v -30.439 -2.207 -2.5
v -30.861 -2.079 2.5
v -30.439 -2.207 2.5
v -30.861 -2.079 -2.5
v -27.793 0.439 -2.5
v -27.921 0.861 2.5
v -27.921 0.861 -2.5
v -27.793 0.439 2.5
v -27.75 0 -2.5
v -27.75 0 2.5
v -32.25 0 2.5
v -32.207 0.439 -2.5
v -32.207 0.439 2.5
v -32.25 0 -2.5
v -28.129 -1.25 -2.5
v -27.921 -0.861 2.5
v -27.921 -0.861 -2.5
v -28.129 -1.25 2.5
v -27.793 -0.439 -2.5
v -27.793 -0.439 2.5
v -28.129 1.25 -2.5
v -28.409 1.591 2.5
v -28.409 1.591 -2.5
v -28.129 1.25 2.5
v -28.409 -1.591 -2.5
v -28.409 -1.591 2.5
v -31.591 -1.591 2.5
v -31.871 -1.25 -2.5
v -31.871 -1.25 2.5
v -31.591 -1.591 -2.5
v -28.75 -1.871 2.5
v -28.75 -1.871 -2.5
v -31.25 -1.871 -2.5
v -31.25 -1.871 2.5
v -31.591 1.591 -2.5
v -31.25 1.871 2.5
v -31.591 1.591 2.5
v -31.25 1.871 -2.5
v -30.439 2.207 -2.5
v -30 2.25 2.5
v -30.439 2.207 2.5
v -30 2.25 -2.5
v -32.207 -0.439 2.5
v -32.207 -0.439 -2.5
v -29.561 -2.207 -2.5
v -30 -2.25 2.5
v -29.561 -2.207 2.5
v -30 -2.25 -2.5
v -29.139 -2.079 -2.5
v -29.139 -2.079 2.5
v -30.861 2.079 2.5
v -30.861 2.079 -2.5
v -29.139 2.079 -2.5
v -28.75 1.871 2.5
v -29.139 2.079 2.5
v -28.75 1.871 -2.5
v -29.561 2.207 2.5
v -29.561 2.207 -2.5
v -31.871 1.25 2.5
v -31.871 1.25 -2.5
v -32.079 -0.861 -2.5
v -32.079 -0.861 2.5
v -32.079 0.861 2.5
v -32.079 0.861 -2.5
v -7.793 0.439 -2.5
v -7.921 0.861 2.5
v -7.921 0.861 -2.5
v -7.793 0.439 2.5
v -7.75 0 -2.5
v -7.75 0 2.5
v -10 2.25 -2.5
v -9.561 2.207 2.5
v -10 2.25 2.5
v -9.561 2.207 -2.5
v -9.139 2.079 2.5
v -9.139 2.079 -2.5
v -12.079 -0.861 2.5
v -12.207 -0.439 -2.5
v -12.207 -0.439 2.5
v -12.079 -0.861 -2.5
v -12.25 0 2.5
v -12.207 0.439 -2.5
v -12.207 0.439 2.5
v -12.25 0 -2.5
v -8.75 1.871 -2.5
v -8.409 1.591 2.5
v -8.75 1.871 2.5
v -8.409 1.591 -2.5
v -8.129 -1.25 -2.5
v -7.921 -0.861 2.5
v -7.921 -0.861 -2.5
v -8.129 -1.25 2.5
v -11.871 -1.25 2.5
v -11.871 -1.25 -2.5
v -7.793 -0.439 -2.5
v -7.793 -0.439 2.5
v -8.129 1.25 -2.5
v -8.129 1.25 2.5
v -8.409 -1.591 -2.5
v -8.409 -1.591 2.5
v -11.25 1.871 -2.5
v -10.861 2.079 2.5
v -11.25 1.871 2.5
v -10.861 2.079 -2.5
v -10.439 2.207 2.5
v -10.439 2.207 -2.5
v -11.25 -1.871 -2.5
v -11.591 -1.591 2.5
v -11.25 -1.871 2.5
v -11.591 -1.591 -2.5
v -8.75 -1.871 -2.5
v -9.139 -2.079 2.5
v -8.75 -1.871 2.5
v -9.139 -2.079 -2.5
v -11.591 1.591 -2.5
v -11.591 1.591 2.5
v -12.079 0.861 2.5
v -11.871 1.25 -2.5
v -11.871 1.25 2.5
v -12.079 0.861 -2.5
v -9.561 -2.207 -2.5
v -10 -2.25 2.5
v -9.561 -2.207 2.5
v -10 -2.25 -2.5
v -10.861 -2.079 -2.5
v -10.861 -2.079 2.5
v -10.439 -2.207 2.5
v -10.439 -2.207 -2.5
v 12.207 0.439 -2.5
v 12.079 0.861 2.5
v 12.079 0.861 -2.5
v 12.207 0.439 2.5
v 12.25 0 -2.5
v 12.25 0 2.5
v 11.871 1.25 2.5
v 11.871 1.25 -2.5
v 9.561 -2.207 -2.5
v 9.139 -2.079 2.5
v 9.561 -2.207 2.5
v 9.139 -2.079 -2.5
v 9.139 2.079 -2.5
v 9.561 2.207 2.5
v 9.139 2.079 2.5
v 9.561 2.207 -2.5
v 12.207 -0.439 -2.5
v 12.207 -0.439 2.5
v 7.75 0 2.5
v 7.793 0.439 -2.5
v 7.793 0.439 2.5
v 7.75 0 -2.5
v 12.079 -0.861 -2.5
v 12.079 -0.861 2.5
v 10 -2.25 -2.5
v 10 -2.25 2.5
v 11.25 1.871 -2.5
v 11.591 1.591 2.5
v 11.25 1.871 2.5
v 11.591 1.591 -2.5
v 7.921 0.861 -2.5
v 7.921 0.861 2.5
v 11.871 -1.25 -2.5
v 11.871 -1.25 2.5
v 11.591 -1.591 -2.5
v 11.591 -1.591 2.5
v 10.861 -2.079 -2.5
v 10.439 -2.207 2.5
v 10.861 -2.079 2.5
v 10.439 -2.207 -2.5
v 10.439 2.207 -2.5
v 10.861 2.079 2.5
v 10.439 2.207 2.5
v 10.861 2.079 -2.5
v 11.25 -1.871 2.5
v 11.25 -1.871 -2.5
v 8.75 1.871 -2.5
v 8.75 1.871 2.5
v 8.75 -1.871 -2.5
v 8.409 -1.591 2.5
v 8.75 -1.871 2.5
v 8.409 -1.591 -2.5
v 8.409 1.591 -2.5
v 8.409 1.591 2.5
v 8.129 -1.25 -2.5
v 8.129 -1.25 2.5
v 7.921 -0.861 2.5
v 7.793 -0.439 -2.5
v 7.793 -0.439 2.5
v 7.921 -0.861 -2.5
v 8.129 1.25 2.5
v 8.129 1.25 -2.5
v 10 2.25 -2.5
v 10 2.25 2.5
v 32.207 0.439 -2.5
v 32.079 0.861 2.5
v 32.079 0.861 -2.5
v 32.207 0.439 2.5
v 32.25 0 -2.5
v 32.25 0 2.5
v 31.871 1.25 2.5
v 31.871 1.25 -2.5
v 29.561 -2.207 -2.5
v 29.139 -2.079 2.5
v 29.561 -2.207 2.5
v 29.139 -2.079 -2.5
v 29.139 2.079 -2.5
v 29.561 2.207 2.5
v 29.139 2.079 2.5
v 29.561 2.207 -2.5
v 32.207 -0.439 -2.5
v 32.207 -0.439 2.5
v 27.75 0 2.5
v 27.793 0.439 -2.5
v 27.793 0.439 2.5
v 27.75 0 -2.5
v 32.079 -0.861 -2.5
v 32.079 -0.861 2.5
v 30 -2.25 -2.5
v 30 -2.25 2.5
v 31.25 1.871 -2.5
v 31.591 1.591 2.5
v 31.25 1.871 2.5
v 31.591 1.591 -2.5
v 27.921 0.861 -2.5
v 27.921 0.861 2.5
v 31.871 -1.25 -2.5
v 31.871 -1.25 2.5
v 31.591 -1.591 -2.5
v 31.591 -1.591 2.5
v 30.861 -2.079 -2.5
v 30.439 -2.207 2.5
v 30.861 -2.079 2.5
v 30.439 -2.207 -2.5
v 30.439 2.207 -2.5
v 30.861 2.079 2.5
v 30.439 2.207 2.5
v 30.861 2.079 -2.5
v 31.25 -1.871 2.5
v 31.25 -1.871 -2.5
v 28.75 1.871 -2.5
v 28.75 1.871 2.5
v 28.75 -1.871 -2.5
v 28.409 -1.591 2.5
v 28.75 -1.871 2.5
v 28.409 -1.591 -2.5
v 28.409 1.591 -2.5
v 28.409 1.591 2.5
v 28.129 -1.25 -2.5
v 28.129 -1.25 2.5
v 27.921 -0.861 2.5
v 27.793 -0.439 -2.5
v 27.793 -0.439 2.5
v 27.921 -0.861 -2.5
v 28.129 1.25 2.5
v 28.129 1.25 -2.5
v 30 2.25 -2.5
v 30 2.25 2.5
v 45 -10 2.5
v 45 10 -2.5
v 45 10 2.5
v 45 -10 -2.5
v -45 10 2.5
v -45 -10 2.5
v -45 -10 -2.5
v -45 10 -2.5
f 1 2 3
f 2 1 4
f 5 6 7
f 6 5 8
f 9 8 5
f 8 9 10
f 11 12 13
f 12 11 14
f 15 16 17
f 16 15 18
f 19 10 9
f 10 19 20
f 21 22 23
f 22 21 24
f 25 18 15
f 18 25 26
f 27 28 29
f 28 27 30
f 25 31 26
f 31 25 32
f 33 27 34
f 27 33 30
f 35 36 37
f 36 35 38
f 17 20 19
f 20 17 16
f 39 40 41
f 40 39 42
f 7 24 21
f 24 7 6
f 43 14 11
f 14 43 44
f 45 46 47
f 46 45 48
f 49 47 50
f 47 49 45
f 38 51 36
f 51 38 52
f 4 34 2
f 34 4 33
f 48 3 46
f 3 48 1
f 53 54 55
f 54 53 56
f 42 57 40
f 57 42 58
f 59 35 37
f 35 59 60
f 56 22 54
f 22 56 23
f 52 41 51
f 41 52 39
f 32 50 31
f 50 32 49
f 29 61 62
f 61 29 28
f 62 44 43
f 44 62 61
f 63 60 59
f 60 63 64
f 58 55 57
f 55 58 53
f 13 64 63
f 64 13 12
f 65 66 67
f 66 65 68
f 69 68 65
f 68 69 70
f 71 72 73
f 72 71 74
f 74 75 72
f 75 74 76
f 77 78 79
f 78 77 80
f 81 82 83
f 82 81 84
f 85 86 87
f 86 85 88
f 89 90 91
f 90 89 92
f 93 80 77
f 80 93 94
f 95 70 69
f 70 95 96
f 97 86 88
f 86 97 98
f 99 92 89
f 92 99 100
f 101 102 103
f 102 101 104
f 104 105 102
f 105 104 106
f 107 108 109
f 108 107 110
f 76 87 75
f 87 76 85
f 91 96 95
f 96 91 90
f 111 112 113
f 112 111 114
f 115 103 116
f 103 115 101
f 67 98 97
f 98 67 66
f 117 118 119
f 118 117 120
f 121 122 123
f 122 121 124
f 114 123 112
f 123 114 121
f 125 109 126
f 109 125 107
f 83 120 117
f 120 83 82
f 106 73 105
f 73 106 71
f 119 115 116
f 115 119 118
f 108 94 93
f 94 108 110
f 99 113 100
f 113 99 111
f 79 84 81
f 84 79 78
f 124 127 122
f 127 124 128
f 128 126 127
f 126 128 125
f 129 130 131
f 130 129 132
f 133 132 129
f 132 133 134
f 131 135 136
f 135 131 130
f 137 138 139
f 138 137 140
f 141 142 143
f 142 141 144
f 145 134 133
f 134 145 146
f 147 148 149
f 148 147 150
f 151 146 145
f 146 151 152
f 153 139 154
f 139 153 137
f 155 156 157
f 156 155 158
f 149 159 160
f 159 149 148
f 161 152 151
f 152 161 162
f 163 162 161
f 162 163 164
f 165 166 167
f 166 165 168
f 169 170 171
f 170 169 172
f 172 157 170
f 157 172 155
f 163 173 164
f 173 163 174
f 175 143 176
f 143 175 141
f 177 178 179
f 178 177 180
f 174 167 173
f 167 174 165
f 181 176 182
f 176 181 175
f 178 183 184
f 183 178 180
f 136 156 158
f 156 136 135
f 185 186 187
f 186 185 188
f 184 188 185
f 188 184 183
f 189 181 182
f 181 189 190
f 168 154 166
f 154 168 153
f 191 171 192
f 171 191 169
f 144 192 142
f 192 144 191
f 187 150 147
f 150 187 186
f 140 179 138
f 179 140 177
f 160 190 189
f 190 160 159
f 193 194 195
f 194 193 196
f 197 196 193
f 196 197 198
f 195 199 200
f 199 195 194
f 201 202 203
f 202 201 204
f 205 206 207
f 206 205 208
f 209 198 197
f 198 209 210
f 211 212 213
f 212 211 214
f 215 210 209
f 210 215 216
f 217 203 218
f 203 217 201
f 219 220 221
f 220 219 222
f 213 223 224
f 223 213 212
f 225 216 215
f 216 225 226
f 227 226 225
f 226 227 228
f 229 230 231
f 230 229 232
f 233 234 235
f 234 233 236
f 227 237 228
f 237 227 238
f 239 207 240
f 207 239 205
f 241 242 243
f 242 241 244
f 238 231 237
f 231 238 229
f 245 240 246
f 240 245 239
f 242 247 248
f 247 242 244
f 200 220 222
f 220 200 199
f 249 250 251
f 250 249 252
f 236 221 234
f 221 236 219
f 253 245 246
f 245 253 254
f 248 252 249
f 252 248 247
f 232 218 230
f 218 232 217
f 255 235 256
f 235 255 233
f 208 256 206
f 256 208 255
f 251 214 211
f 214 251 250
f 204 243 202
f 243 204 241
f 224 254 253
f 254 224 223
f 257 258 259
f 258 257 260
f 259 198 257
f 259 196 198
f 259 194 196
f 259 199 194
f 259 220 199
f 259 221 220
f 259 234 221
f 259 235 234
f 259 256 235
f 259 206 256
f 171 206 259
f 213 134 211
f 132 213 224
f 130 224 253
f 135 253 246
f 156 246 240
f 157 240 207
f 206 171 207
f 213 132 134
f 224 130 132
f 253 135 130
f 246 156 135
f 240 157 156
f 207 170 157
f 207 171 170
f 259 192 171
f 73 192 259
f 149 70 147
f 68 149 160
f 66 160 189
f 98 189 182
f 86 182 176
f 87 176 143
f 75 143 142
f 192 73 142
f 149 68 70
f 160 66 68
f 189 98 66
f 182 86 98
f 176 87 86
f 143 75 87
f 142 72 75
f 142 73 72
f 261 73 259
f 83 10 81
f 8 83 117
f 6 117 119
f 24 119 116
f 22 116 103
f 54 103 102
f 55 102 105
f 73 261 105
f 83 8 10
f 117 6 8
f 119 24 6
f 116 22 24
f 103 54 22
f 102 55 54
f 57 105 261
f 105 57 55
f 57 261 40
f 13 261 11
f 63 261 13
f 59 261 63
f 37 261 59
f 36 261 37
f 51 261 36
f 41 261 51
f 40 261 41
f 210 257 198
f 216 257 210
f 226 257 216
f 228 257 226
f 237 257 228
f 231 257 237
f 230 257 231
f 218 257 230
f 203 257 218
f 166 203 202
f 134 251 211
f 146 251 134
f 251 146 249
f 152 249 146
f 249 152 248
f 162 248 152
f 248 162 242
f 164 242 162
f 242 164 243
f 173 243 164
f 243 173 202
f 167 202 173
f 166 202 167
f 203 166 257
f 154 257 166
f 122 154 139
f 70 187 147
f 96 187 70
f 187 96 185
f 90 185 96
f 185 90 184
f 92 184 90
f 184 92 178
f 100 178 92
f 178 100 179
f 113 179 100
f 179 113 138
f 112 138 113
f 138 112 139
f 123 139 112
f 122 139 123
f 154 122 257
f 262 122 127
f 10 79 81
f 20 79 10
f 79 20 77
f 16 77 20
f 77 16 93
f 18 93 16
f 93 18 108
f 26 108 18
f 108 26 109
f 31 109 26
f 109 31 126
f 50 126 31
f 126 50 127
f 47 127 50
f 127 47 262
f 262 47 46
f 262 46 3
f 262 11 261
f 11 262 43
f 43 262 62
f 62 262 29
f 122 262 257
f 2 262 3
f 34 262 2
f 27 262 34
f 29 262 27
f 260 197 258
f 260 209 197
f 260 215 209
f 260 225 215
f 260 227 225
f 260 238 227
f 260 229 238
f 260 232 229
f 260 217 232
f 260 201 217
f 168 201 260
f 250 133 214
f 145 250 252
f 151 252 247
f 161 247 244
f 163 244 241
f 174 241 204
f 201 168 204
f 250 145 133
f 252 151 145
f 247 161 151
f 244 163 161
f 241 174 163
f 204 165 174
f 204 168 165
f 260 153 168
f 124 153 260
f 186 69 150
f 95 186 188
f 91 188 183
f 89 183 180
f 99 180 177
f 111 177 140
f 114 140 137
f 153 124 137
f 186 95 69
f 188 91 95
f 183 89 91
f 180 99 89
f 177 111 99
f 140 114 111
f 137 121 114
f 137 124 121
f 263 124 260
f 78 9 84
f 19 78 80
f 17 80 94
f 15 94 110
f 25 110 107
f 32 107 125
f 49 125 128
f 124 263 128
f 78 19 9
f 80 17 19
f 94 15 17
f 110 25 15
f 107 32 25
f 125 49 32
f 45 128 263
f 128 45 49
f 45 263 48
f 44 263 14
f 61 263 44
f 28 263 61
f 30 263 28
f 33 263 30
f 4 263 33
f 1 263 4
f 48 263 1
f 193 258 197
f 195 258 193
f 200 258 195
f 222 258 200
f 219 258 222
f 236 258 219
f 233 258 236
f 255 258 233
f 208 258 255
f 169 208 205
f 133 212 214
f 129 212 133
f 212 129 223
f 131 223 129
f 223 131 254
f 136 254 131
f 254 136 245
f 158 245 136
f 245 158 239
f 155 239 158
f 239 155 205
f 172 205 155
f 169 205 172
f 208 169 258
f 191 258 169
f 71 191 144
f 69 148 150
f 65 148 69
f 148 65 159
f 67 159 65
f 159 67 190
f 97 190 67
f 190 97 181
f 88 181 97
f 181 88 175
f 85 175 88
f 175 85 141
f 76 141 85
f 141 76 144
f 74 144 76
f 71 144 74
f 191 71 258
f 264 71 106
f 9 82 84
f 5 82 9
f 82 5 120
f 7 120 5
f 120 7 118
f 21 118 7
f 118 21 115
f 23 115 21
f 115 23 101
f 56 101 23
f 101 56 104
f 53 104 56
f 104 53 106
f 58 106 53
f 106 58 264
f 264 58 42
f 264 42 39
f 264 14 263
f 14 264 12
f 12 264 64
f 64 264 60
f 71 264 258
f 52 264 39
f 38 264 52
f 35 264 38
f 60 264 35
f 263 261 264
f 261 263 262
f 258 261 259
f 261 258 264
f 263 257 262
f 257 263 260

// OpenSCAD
$fn = 32;

// ----------------------------------------------------------------------
// Hole bar, 4 x Ø4.5
// skip layout, 15 mm edge offset
// ----------------------------------------------------------------------

// --- parameters (mm) ---
bar_w = 20;       // bar width (Y)
bar_t = 5;        // bar thickness (Z)
holes = 4;        // holes per row
hole_d = 4.5;     // hole diameter
edge = 15;        // offset from the bar end to the first hole
grid_pitch = 10;  // grid the bar was laid out on

// --- derived feature positions (mm) ---
pitch = grid_pitch * 2;       // = 20   holes sit every other grid slot
span = (holes - 1) * pitch;   // = 60   distance between the end holes
bar_l = span + 2 * edge;      // = 90   overall bar length
start_x = -bar_l / 2 + edge;  // = -30   X of the first hole
feature_centers = [
  [start_x + 0 * pitch, 0],
  [start_x + 1 * pitch, 0],
  [start_x + 2 * pitch, 0],
  [start_x + 3 * pitch, 0]
];   // hole centres of the first row

// bar with one row of holes, drilled from feature_centers
difference() {
  translate([-bar_l / 2, -bar_w / 2, -bar_t / 2]) cube([bar_l, bar_w, bar_t]);
  for (centre = feature_centers)
    translate([centre[0], centre[1], 0])
      cylinder(d = hole_d, h = bar_t + 2, center = true);
}
